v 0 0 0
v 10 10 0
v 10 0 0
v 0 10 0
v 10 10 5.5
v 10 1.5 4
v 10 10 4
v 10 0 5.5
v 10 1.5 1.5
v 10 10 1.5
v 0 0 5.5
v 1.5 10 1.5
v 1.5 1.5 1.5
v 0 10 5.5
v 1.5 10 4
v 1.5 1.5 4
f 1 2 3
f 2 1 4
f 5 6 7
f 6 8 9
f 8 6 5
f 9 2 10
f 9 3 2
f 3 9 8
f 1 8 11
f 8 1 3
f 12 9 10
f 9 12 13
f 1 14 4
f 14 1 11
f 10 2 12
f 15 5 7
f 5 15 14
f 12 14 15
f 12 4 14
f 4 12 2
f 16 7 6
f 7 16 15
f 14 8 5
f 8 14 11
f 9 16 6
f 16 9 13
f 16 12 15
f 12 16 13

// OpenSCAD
plexiThickness = 2.5;
shellThickness = 1.5;
length = 10;

linear_extrude(shellThickness)
polygon(
[
[0,0],
[0, 10],
[length,10],
[length,0]
]
);


translate([0,0,plexiThickness + shellThickness])
linear_extrude(shellThickness)
polygon(
[
[0,0],
[0, 10],
[length,10],
[length,0]
]
);


#linear_extrude(shellThickness * 2+ plexiThickness)
polygon (
[
[0,0],
[0, shellThickness],
[length,shellThickness],
[length,0]
]
);

translate([shellThickness, 0,0])
rotate([0,0,90])
#linear_extrude(shellThickness * 2+ plexiThickness)
polygon (
[
[0,0],
[0, shellThickness],
[length,shellThickness],
[length,0]
]
);
